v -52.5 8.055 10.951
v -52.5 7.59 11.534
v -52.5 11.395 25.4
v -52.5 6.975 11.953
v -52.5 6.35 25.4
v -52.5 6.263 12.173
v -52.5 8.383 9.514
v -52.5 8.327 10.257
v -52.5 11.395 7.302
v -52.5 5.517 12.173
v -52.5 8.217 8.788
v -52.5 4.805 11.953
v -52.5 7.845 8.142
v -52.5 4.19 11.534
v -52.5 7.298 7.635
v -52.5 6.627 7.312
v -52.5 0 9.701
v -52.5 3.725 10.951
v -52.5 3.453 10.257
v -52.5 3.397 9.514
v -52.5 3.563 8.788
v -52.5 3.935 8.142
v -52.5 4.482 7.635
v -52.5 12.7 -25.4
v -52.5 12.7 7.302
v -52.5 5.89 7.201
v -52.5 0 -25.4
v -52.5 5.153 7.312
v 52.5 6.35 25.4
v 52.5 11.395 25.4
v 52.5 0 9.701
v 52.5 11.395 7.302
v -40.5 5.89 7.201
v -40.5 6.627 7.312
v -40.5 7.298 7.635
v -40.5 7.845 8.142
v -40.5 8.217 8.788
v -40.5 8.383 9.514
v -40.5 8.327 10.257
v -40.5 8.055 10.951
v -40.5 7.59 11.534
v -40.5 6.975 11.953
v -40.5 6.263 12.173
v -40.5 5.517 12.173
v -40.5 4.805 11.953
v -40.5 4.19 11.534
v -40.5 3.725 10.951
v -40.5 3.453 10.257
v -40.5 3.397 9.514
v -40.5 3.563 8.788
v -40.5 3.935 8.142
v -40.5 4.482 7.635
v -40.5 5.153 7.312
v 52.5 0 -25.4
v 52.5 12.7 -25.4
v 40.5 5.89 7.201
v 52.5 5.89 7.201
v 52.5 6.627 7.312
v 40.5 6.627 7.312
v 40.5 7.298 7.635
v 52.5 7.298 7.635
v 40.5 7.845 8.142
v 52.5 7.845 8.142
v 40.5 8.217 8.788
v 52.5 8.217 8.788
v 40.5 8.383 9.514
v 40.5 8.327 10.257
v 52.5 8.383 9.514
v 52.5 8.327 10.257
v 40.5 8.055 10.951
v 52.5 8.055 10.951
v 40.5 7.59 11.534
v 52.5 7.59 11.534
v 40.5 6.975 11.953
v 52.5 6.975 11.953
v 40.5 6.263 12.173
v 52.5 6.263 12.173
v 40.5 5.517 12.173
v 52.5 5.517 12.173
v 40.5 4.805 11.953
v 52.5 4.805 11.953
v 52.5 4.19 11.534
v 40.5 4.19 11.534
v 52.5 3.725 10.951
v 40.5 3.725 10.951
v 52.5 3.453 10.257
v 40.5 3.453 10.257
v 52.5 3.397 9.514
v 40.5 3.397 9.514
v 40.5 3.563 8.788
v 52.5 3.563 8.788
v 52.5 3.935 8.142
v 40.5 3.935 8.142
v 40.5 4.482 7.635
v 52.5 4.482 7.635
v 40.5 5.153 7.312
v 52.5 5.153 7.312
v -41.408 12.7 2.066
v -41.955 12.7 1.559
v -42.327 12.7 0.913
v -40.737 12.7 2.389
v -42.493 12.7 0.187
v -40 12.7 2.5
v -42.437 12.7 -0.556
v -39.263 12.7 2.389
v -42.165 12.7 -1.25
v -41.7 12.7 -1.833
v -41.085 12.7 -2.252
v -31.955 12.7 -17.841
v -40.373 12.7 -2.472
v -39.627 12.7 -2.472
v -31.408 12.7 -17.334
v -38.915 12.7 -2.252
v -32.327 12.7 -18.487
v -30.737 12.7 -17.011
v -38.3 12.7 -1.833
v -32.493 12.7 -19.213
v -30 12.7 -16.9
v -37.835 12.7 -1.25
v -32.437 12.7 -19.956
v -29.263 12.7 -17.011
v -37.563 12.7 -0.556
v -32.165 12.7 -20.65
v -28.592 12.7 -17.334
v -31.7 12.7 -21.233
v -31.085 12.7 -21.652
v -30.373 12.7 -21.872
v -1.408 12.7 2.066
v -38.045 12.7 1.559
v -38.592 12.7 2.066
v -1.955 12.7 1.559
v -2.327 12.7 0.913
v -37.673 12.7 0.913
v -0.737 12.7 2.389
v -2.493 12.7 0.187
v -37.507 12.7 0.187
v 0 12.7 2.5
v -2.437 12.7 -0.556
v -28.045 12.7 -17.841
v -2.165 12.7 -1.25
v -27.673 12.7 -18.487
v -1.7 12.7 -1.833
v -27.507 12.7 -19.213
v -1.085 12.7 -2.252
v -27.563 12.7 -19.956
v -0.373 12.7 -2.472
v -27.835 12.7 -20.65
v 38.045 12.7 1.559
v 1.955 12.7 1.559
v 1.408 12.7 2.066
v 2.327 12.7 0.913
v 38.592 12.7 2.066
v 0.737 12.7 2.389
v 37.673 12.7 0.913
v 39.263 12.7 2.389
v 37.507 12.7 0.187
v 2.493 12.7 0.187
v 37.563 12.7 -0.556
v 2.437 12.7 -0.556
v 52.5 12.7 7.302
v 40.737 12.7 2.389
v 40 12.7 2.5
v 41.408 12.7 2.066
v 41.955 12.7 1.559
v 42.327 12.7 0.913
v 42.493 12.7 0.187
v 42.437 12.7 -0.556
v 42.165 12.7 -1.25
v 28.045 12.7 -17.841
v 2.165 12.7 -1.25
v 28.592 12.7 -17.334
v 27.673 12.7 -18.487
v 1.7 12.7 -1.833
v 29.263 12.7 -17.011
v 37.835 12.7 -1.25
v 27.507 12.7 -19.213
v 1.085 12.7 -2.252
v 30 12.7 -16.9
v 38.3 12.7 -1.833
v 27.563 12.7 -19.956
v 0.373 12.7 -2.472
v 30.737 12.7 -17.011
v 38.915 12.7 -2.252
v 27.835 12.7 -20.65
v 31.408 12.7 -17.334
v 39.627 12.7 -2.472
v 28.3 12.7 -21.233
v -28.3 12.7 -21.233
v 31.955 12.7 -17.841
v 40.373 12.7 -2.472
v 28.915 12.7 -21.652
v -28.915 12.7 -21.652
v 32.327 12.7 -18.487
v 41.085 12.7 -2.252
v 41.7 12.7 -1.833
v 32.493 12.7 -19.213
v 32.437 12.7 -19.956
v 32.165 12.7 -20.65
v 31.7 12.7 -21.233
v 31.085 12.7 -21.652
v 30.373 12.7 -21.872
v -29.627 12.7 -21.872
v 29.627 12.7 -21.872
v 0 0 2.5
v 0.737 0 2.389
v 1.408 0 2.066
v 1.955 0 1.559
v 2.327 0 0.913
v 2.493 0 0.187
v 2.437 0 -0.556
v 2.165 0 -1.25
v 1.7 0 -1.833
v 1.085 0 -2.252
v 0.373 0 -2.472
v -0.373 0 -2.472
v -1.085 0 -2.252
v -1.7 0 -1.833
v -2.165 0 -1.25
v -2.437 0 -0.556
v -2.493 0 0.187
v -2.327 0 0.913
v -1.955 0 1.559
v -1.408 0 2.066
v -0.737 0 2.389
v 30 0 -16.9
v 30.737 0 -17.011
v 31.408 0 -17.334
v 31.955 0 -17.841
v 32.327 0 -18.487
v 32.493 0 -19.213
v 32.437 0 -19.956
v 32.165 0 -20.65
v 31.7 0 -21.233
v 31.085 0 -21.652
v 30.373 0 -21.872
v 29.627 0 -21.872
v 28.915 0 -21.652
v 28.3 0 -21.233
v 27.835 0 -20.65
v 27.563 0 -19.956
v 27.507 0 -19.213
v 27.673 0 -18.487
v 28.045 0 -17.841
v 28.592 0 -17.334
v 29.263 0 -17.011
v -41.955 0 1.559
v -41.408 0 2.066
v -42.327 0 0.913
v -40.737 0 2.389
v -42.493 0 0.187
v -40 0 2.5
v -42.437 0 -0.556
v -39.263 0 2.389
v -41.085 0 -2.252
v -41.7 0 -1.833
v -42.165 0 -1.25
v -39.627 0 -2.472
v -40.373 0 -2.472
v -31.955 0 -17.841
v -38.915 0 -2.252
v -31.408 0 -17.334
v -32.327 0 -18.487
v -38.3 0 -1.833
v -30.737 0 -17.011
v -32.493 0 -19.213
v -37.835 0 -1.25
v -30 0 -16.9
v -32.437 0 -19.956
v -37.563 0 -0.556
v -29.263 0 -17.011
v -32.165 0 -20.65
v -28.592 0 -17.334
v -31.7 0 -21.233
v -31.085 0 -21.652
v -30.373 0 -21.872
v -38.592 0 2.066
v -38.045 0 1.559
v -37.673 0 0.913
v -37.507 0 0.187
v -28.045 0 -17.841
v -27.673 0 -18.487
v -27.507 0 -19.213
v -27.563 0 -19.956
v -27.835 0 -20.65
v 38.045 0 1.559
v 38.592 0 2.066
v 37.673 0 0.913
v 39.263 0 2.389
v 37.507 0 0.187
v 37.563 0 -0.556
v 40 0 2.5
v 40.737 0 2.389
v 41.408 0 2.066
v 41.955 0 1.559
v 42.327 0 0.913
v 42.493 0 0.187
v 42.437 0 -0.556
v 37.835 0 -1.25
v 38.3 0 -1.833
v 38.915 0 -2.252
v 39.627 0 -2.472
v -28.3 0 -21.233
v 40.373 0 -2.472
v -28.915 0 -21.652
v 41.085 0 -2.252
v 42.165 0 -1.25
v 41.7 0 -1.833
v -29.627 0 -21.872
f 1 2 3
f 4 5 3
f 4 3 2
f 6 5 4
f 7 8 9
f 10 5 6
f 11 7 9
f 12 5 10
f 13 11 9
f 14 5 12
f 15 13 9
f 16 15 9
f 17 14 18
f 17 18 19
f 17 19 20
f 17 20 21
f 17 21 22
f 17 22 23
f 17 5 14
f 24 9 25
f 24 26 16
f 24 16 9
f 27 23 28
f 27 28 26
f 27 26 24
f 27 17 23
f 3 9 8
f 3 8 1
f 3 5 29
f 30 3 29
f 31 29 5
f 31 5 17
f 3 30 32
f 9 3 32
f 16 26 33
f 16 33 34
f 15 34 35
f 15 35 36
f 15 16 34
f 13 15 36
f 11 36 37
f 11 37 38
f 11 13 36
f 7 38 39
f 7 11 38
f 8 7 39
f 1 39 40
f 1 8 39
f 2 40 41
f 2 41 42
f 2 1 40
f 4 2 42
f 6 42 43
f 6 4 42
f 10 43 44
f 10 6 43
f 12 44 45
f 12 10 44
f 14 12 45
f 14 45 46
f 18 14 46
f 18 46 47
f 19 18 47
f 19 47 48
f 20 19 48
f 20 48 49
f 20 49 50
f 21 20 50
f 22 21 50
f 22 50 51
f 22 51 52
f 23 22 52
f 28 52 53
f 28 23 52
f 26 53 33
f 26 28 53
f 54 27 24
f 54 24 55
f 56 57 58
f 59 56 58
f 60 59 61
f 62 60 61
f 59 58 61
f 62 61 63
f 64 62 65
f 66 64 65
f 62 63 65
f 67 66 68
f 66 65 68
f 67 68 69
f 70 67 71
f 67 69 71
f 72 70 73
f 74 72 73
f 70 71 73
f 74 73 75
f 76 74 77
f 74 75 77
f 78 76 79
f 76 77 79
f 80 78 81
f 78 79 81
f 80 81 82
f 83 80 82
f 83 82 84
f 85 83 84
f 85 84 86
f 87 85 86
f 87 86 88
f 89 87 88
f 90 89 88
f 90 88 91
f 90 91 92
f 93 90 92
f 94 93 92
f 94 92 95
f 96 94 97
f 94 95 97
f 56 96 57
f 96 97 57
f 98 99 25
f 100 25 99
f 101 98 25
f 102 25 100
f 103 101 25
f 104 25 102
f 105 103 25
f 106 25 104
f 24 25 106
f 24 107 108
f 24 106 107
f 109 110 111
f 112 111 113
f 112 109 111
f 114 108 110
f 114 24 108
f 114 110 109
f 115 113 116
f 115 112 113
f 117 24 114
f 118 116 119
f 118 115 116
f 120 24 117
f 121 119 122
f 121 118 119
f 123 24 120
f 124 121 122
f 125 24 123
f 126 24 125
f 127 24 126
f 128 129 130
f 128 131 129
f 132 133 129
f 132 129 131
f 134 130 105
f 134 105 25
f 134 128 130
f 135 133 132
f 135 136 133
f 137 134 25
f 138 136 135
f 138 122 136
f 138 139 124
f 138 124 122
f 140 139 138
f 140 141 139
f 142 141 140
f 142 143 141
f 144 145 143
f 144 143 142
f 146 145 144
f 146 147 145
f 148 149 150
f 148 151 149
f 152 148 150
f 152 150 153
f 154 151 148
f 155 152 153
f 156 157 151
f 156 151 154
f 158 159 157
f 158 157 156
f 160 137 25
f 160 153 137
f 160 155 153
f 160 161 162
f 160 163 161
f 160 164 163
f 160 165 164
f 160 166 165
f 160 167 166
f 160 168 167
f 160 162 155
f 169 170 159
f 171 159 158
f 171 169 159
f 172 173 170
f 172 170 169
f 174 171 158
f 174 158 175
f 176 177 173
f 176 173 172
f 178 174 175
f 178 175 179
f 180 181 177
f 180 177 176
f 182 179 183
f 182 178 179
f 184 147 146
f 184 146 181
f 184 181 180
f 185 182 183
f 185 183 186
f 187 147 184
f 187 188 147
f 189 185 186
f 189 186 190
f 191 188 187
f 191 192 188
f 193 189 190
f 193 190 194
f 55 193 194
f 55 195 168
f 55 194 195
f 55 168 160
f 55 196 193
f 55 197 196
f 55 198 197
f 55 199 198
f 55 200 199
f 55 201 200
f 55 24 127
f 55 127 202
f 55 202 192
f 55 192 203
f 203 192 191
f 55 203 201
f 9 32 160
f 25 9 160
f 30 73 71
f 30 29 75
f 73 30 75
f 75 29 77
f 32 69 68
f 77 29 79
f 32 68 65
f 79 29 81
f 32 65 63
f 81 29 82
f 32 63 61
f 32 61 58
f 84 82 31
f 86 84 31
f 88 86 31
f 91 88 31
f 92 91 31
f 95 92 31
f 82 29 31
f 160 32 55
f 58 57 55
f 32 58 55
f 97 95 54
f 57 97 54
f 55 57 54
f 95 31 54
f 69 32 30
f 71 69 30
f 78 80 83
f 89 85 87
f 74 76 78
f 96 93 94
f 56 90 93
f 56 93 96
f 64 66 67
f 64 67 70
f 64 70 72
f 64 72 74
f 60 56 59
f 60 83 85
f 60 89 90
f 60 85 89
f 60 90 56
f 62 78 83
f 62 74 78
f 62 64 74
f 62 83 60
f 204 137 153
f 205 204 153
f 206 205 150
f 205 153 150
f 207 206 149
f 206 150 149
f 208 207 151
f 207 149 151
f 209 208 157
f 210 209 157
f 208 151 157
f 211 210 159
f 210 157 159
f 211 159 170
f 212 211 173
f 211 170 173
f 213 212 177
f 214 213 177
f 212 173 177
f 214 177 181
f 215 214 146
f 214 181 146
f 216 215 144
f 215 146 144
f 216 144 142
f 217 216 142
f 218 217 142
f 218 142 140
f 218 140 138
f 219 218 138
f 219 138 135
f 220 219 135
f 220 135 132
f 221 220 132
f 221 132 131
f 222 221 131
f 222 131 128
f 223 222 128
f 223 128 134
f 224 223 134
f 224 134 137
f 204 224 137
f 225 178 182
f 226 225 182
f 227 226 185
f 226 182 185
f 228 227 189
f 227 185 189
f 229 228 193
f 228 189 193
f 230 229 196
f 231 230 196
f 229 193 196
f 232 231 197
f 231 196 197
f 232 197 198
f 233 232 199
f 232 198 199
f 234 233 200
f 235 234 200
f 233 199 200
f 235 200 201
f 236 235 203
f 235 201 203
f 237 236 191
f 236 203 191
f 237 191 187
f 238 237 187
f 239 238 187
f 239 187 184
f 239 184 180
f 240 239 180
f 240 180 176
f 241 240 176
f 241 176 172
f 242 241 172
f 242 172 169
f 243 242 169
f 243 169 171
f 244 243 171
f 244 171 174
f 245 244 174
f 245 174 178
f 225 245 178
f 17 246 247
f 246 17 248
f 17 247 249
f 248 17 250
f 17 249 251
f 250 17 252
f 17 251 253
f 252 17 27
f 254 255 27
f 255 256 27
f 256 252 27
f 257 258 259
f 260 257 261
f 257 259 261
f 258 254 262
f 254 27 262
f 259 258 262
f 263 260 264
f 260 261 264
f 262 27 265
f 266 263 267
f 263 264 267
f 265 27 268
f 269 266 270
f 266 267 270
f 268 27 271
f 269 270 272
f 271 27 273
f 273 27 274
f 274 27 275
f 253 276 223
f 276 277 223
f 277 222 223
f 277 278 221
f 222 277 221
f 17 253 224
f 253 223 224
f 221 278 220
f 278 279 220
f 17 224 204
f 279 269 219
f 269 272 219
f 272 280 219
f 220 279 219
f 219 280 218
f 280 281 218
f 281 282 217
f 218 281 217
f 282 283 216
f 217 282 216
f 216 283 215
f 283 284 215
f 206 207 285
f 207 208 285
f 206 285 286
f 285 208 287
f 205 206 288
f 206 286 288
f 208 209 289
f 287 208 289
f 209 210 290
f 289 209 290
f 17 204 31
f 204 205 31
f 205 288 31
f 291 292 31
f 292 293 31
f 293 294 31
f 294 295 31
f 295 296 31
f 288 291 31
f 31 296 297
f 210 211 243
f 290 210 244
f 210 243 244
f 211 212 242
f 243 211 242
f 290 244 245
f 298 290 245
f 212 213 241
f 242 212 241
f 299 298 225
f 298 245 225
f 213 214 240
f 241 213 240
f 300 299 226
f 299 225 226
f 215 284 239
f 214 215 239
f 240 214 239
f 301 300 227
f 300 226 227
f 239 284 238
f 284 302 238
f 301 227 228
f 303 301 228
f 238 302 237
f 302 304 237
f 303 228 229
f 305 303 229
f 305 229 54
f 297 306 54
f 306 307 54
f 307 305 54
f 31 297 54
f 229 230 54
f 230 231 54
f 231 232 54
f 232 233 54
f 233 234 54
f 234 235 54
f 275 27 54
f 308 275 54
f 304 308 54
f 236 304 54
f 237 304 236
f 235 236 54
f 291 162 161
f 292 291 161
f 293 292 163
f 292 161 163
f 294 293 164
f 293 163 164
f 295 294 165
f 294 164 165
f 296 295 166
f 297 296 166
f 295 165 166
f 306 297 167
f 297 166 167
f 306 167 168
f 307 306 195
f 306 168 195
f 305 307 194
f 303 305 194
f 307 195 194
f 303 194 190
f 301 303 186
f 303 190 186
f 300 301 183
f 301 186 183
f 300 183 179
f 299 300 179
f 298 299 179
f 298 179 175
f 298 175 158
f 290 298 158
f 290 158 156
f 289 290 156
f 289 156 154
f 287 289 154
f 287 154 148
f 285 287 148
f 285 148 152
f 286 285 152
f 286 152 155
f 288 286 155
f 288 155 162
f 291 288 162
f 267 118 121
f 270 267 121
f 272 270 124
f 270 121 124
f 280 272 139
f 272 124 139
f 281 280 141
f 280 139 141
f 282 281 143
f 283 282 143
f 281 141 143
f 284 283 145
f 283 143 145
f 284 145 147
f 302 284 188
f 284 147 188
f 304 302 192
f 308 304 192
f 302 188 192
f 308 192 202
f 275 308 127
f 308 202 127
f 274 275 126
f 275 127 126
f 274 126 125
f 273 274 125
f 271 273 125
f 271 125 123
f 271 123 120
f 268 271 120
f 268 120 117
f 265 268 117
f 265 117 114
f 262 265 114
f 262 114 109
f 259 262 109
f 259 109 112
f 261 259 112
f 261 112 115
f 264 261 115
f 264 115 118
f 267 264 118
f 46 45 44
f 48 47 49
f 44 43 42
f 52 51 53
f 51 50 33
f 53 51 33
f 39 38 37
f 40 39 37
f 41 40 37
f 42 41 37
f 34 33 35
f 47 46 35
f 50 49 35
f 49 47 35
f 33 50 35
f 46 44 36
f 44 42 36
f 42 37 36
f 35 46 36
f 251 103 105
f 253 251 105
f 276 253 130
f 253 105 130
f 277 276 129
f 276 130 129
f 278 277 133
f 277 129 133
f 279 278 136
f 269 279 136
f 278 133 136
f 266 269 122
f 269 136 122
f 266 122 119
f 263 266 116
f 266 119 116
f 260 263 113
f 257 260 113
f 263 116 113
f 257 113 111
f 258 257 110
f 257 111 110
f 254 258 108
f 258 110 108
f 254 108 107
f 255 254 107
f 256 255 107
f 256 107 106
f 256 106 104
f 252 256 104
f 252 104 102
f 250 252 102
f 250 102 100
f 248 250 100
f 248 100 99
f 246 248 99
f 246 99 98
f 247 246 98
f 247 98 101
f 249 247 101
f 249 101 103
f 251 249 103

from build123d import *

# Parameters (mm, degrees)
CROQUIS1_W              = 105
CROQUIS1_H              = 50.8
SALIENTE_EXTRUIR1_DEPTH = 12.7
CROQUIS2_W              = 18.097769025
CROQUIS2_H              = 1.305463626
CORTAR_EXTRUIR1_DEPTH   = 109.772468943
CROQUIS3_R              = 2.5
CORTAR_EXTRUIR2_DEPTH   = 60.688357324
CROQUIS4_R              = 2.5
CORTAR_EXTRUIR3_DEPTH   = 60.688357324
CROQUIS5_R              = 2.5
CORTAR_EXTRUIR4_DEPTH   = 12


with BuildPart() as part:
    # Croquis1 → Saliente-Extruir1 (new body)
    with BuildSketch(Plane(origin=(0, 0, 0), x_dir=(1, 0, 0), z_dir=(0, 1, 0))):
        Rectangle(CROQUIS1_W, CROQUIS1_H)
    extrude(amount=SALIENTE_EXTRUIR1_DEPTH)

    # Croquis2 → Cortar-Extruir1 (cut, through all)
    with BuildSketch(Plane(origin=(52.5, 0, 0), x_dir=(0, 0, -1), z_dir=(1, 0, 0))):
        Polygon((-25.4, 6.35), (-9.701031489, 0), (-25.4, 0), align=None)
        with Locations((-16.351115488, 12.047268187)):
            Rectangle(CROQUIS2_W, CROQUIS2_H)
    extrude(amount=-CORTAR_EXTRUIR1_DEPTH, mode=Mode.SUBTRACT)

    # Croquis3 → Cortar-Extruir2 (cut, through all)
    with BuildSketch(Plane(origin=(0, 12.7, 0), x_dir=(1, 0, 0), z_dir=(0, 1, 0))):
        with Locations(Location((0, 0, 0), (0, 0, 270))):
            Circle(CROQUIS3_R)
        with Locations(Location((-40, 0, 0), (0, 0, 270))):
            Circle(CROQUIS3_R)
        with Locations(Location((40, 0, 0), (0, 0, 270))):
            Circle(CROQUIS3_R)
    extrude(amount=-CORTAR_EXTRUIR2_DEPTH, mode=Mode.SUBTRACT)

    # Croquis4 → Cortar-Extruir3 (cut, through all)
    with BuildSketch(Plane(origin=(0, 12.7, 0), x_dir=(1, 0, 0), z_dir=(0, 1, 0))):
        with Locations(Location((-30, 19.4, 0), (0, 0, 270))):
            Circle(CROQUIS4_R)
        with Locations(Location((30, 19.4, 0), (0, 0, 270))):
            Circle(CROQUIS4_R)
    extrude(amount=-CORTAR_EXTRUIR3_DEPTH, mode=Mode.SUBTRACT)

    # Croquis5 → Cortar-Extruir4 (cut)
    with BuildSketch(Plane(origin=(52.5, 0, 0), x_dir=(0, 0, -1), z_dir=(1, 0, 0))):
        with Locations((-9.701031489, 5.890011881)):
            Circle(CROQUIS5_R)
    cortar_extruir4 = extrude(amount=-CORTAR_EXTRUIR4_DEPTH, mode=Mode.SUBTRACT)

    # Simetría1: Cortar-Extruir4 across plane
    add(cortar_extruir4.mirror(Plane(origin=(0, 0, 0), x_dir=(0, 0, 1), z_dir=(1, 0, 0))), mode=Mode.SUBTRACT)


solid = part.part
